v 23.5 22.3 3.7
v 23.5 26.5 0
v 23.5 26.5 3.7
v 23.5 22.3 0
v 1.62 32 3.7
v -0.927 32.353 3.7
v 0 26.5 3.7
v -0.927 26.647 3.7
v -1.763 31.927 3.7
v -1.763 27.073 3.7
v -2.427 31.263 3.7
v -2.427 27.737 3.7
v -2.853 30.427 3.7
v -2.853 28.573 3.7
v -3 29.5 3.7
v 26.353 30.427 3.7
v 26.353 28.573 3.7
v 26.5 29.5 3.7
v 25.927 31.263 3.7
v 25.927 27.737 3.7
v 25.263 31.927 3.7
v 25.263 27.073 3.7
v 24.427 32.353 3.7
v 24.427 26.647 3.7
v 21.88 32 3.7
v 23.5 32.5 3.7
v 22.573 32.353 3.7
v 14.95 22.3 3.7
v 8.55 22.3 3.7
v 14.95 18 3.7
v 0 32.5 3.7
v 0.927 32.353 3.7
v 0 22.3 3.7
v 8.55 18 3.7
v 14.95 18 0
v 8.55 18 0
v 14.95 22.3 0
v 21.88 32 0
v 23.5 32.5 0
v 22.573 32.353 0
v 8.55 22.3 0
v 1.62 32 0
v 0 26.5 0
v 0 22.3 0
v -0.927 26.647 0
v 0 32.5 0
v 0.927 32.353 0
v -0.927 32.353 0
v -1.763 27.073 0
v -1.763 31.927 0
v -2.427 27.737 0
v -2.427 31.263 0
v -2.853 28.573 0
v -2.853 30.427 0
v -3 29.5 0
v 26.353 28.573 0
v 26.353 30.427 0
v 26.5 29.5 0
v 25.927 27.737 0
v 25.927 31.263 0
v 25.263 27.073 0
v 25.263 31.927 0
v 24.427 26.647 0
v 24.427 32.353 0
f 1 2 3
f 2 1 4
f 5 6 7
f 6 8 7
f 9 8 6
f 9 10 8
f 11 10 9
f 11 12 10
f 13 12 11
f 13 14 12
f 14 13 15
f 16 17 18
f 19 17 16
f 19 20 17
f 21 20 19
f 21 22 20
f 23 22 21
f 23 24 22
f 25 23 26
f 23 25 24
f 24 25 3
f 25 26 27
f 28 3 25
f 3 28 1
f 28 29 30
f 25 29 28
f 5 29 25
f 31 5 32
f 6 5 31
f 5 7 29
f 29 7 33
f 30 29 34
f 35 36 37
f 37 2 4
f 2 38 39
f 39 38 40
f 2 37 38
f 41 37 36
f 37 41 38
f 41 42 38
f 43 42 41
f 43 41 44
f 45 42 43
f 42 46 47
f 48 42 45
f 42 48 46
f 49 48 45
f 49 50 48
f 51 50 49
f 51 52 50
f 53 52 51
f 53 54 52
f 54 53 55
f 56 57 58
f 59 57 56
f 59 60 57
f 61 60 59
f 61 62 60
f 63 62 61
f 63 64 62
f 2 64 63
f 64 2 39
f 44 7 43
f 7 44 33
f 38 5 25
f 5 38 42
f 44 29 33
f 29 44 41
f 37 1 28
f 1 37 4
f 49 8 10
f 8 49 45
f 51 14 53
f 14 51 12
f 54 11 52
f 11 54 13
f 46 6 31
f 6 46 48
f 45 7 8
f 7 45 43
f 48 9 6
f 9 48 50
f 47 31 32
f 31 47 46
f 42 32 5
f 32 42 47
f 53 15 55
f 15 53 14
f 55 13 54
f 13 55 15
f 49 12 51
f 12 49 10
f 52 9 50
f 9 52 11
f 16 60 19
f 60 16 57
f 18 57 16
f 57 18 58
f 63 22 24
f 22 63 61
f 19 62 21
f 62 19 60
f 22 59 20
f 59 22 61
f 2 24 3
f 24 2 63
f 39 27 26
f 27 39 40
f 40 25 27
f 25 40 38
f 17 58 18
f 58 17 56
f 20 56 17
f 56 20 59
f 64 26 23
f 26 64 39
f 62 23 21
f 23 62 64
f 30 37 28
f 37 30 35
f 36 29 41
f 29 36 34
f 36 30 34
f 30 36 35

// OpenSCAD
// prise USB Station

h=19;
x=23.5;
y=14;
d0=128;
yp=11.5;  // decalage plot sur Y
r=3;      // rayon plot

j=.3;

//haut();
translate([0,y+4,0]) bas();

module bas()
{
h=4-j;
   translate([0,4+j,0]) cube([x,y-4-j,h]);
   translate([0,yp,0]) cylinder(h,r,r,$fn=20);
   translate([x,yp,0]) cylinder(h,r,r,$fn=20);
   translate([(x-7)/2+j,0,0]) cube([7-2*j,4+j,h]);
}

module haut()
{
difference()
{

    union()
    {
        intersection()
        {
            translate([x/2,d0/2,0]) union()
            {
                cylinder(h,d0/2,d0/2,$fn=300);
                translate([-x/2,-d0/2,0]) cube([x/2,d0/2,h]) ;
            }
            cube([x,y,h]);
        }
        translate([0,yp,0]) cylinder(h,r,r,$fn=20);
        translate([x,yp,0]) cylinder(h,r,r,$fn=20);
    }
    hull()
    {
        translate([x/2,-.1,5+5.5]) rotate([-90,0,0]) cylinder(y+.2,3.5,3.5,$fn=20);
        translate([x/2,-.1,5+5.5+h]) rotate([-90,0,0]) cylinder(y+.2,3.5,3.5,$fn=20);
    }
    hull()
    {
        translate([x/2-4,4,5+3.5]) rotate([-90,0,0]) cylinder(y+.2,4.5,4.5,$fn=20);
        translate([x/2+4,4,5+3.5]) rotate([-90,0,0]) cylinder(y+.2,4.5,4.5,$fn=20);
        translate([(x-8-2*4.5)/2,4,h-4]) cube([8+2*4.5,y,4]);
    }
    translate([-r,4,h-4]) cube([x+2*r,y,4]);
}
}
